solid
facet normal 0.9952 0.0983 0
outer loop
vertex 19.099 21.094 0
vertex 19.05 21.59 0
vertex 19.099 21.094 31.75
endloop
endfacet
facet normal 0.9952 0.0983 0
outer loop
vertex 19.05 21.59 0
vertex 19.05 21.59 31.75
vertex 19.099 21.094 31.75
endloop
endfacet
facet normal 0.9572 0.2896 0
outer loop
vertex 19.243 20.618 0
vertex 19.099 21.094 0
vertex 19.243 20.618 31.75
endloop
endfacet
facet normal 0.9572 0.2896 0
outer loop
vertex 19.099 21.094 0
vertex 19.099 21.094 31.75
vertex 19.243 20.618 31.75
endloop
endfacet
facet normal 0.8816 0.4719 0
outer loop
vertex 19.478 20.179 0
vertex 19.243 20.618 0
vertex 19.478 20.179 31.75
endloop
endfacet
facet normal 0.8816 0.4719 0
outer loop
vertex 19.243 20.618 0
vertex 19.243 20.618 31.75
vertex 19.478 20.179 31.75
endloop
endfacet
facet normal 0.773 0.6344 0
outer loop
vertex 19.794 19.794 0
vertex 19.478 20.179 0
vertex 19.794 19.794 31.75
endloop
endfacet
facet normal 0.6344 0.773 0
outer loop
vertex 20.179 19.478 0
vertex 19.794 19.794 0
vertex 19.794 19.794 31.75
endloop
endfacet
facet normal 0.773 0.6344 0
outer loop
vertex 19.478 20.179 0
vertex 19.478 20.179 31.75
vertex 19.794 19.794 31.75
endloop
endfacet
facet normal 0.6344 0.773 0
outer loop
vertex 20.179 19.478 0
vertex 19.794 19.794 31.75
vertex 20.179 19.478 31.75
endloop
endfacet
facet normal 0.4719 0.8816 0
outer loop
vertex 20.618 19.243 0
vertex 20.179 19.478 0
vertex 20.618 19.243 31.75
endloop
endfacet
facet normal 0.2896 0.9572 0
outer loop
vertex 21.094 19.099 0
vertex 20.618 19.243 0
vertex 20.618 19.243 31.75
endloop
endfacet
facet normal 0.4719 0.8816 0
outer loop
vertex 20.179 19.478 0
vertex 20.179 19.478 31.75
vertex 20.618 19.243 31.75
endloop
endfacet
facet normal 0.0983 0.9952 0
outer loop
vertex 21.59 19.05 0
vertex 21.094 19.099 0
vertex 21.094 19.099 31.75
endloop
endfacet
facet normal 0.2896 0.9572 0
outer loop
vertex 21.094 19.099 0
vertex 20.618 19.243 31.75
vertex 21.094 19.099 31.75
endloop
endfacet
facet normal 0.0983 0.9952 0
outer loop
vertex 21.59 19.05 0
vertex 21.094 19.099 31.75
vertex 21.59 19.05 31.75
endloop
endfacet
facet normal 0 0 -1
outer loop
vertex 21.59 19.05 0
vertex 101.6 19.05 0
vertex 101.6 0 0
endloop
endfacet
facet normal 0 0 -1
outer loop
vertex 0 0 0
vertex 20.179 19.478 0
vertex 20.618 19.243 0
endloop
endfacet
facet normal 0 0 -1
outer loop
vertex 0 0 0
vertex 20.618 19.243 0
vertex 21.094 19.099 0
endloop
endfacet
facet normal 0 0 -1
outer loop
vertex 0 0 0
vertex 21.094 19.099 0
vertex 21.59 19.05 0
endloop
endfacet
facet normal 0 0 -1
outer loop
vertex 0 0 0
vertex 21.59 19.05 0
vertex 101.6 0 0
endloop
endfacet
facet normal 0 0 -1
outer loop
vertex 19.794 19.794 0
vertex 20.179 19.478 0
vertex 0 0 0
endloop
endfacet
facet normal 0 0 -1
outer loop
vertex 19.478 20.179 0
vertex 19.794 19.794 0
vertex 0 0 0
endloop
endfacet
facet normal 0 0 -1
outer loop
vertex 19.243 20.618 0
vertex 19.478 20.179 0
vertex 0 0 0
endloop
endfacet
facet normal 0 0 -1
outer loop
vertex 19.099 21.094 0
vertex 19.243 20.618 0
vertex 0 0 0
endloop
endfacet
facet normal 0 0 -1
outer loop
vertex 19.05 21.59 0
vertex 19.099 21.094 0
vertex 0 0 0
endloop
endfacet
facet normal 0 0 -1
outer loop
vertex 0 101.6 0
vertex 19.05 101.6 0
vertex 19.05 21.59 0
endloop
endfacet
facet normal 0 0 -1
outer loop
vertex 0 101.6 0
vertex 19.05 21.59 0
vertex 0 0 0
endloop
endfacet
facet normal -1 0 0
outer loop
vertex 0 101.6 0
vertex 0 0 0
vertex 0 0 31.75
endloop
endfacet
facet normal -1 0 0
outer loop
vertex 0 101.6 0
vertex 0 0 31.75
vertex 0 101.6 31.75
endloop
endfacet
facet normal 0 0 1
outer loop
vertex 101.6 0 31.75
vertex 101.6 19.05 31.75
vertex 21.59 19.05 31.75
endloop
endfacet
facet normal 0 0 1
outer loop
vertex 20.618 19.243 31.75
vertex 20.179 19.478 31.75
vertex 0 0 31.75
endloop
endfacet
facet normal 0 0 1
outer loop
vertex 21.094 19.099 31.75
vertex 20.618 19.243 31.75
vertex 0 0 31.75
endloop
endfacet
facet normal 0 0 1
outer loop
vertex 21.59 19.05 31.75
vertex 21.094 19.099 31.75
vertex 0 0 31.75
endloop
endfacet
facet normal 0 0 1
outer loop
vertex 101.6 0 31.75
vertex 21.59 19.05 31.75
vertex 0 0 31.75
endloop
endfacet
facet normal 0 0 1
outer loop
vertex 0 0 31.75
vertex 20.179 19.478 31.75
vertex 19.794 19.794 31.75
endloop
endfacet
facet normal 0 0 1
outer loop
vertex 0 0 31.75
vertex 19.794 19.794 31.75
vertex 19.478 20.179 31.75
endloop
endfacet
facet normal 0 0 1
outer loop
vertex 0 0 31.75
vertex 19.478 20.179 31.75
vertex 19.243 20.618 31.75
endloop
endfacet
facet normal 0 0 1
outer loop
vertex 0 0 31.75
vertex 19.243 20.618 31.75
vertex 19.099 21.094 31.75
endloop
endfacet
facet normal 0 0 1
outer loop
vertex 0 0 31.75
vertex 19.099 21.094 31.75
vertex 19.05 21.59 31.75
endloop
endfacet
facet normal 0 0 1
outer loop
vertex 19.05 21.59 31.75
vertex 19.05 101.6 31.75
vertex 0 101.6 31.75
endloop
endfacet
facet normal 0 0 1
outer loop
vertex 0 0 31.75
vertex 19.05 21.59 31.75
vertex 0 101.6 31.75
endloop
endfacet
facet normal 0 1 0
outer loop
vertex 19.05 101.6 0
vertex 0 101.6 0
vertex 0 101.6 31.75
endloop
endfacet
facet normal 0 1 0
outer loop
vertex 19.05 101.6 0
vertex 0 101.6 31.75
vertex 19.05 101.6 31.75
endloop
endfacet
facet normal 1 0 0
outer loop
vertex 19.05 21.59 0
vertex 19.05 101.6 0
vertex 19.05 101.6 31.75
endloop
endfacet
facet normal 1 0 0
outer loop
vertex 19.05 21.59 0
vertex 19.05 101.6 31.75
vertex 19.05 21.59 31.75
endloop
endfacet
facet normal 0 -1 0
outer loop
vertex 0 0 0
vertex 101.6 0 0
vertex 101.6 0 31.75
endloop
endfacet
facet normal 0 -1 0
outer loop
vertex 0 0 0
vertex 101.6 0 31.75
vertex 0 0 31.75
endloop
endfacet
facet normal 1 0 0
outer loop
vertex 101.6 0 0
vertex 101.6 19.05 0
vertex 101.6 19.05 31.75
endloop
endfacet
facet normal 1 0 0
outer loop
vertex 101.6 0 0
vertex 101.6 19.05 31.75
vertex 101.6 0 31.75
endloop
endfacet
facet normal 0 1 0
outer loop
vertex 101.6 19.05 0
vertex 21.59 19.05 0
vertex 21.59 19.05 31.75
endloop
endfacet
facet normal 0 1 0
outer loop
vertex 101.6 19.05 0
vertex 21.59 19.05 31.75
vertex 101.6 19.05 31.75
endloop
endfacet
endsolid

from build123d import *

# Parameters (mm, degrees)
EXTRUDE1_DEPTH = 31.75
FILLET1_R      = 2.54


with BuildPart() as part:
    # Sketch1 → Extrude1 (new body)
    with BuildSketch(Plane.XY):
        Polygon((19.05, 101.6), (19.05, 19.05), (101.6, 19.05), (101.6, 0), (0, 0), (0, 101.6), align=None)
    extrude(amount=EXTRUDE1_DEPTH)

    # Fillet1
    fillet1_edges = [part.edges().sort_by_distance(p)[0] for p in [
        (19.05, 19.05, 15.875),
    ]]
    fillet(fillet1_edges, radius=FILLET1_R)


solid = part.part
